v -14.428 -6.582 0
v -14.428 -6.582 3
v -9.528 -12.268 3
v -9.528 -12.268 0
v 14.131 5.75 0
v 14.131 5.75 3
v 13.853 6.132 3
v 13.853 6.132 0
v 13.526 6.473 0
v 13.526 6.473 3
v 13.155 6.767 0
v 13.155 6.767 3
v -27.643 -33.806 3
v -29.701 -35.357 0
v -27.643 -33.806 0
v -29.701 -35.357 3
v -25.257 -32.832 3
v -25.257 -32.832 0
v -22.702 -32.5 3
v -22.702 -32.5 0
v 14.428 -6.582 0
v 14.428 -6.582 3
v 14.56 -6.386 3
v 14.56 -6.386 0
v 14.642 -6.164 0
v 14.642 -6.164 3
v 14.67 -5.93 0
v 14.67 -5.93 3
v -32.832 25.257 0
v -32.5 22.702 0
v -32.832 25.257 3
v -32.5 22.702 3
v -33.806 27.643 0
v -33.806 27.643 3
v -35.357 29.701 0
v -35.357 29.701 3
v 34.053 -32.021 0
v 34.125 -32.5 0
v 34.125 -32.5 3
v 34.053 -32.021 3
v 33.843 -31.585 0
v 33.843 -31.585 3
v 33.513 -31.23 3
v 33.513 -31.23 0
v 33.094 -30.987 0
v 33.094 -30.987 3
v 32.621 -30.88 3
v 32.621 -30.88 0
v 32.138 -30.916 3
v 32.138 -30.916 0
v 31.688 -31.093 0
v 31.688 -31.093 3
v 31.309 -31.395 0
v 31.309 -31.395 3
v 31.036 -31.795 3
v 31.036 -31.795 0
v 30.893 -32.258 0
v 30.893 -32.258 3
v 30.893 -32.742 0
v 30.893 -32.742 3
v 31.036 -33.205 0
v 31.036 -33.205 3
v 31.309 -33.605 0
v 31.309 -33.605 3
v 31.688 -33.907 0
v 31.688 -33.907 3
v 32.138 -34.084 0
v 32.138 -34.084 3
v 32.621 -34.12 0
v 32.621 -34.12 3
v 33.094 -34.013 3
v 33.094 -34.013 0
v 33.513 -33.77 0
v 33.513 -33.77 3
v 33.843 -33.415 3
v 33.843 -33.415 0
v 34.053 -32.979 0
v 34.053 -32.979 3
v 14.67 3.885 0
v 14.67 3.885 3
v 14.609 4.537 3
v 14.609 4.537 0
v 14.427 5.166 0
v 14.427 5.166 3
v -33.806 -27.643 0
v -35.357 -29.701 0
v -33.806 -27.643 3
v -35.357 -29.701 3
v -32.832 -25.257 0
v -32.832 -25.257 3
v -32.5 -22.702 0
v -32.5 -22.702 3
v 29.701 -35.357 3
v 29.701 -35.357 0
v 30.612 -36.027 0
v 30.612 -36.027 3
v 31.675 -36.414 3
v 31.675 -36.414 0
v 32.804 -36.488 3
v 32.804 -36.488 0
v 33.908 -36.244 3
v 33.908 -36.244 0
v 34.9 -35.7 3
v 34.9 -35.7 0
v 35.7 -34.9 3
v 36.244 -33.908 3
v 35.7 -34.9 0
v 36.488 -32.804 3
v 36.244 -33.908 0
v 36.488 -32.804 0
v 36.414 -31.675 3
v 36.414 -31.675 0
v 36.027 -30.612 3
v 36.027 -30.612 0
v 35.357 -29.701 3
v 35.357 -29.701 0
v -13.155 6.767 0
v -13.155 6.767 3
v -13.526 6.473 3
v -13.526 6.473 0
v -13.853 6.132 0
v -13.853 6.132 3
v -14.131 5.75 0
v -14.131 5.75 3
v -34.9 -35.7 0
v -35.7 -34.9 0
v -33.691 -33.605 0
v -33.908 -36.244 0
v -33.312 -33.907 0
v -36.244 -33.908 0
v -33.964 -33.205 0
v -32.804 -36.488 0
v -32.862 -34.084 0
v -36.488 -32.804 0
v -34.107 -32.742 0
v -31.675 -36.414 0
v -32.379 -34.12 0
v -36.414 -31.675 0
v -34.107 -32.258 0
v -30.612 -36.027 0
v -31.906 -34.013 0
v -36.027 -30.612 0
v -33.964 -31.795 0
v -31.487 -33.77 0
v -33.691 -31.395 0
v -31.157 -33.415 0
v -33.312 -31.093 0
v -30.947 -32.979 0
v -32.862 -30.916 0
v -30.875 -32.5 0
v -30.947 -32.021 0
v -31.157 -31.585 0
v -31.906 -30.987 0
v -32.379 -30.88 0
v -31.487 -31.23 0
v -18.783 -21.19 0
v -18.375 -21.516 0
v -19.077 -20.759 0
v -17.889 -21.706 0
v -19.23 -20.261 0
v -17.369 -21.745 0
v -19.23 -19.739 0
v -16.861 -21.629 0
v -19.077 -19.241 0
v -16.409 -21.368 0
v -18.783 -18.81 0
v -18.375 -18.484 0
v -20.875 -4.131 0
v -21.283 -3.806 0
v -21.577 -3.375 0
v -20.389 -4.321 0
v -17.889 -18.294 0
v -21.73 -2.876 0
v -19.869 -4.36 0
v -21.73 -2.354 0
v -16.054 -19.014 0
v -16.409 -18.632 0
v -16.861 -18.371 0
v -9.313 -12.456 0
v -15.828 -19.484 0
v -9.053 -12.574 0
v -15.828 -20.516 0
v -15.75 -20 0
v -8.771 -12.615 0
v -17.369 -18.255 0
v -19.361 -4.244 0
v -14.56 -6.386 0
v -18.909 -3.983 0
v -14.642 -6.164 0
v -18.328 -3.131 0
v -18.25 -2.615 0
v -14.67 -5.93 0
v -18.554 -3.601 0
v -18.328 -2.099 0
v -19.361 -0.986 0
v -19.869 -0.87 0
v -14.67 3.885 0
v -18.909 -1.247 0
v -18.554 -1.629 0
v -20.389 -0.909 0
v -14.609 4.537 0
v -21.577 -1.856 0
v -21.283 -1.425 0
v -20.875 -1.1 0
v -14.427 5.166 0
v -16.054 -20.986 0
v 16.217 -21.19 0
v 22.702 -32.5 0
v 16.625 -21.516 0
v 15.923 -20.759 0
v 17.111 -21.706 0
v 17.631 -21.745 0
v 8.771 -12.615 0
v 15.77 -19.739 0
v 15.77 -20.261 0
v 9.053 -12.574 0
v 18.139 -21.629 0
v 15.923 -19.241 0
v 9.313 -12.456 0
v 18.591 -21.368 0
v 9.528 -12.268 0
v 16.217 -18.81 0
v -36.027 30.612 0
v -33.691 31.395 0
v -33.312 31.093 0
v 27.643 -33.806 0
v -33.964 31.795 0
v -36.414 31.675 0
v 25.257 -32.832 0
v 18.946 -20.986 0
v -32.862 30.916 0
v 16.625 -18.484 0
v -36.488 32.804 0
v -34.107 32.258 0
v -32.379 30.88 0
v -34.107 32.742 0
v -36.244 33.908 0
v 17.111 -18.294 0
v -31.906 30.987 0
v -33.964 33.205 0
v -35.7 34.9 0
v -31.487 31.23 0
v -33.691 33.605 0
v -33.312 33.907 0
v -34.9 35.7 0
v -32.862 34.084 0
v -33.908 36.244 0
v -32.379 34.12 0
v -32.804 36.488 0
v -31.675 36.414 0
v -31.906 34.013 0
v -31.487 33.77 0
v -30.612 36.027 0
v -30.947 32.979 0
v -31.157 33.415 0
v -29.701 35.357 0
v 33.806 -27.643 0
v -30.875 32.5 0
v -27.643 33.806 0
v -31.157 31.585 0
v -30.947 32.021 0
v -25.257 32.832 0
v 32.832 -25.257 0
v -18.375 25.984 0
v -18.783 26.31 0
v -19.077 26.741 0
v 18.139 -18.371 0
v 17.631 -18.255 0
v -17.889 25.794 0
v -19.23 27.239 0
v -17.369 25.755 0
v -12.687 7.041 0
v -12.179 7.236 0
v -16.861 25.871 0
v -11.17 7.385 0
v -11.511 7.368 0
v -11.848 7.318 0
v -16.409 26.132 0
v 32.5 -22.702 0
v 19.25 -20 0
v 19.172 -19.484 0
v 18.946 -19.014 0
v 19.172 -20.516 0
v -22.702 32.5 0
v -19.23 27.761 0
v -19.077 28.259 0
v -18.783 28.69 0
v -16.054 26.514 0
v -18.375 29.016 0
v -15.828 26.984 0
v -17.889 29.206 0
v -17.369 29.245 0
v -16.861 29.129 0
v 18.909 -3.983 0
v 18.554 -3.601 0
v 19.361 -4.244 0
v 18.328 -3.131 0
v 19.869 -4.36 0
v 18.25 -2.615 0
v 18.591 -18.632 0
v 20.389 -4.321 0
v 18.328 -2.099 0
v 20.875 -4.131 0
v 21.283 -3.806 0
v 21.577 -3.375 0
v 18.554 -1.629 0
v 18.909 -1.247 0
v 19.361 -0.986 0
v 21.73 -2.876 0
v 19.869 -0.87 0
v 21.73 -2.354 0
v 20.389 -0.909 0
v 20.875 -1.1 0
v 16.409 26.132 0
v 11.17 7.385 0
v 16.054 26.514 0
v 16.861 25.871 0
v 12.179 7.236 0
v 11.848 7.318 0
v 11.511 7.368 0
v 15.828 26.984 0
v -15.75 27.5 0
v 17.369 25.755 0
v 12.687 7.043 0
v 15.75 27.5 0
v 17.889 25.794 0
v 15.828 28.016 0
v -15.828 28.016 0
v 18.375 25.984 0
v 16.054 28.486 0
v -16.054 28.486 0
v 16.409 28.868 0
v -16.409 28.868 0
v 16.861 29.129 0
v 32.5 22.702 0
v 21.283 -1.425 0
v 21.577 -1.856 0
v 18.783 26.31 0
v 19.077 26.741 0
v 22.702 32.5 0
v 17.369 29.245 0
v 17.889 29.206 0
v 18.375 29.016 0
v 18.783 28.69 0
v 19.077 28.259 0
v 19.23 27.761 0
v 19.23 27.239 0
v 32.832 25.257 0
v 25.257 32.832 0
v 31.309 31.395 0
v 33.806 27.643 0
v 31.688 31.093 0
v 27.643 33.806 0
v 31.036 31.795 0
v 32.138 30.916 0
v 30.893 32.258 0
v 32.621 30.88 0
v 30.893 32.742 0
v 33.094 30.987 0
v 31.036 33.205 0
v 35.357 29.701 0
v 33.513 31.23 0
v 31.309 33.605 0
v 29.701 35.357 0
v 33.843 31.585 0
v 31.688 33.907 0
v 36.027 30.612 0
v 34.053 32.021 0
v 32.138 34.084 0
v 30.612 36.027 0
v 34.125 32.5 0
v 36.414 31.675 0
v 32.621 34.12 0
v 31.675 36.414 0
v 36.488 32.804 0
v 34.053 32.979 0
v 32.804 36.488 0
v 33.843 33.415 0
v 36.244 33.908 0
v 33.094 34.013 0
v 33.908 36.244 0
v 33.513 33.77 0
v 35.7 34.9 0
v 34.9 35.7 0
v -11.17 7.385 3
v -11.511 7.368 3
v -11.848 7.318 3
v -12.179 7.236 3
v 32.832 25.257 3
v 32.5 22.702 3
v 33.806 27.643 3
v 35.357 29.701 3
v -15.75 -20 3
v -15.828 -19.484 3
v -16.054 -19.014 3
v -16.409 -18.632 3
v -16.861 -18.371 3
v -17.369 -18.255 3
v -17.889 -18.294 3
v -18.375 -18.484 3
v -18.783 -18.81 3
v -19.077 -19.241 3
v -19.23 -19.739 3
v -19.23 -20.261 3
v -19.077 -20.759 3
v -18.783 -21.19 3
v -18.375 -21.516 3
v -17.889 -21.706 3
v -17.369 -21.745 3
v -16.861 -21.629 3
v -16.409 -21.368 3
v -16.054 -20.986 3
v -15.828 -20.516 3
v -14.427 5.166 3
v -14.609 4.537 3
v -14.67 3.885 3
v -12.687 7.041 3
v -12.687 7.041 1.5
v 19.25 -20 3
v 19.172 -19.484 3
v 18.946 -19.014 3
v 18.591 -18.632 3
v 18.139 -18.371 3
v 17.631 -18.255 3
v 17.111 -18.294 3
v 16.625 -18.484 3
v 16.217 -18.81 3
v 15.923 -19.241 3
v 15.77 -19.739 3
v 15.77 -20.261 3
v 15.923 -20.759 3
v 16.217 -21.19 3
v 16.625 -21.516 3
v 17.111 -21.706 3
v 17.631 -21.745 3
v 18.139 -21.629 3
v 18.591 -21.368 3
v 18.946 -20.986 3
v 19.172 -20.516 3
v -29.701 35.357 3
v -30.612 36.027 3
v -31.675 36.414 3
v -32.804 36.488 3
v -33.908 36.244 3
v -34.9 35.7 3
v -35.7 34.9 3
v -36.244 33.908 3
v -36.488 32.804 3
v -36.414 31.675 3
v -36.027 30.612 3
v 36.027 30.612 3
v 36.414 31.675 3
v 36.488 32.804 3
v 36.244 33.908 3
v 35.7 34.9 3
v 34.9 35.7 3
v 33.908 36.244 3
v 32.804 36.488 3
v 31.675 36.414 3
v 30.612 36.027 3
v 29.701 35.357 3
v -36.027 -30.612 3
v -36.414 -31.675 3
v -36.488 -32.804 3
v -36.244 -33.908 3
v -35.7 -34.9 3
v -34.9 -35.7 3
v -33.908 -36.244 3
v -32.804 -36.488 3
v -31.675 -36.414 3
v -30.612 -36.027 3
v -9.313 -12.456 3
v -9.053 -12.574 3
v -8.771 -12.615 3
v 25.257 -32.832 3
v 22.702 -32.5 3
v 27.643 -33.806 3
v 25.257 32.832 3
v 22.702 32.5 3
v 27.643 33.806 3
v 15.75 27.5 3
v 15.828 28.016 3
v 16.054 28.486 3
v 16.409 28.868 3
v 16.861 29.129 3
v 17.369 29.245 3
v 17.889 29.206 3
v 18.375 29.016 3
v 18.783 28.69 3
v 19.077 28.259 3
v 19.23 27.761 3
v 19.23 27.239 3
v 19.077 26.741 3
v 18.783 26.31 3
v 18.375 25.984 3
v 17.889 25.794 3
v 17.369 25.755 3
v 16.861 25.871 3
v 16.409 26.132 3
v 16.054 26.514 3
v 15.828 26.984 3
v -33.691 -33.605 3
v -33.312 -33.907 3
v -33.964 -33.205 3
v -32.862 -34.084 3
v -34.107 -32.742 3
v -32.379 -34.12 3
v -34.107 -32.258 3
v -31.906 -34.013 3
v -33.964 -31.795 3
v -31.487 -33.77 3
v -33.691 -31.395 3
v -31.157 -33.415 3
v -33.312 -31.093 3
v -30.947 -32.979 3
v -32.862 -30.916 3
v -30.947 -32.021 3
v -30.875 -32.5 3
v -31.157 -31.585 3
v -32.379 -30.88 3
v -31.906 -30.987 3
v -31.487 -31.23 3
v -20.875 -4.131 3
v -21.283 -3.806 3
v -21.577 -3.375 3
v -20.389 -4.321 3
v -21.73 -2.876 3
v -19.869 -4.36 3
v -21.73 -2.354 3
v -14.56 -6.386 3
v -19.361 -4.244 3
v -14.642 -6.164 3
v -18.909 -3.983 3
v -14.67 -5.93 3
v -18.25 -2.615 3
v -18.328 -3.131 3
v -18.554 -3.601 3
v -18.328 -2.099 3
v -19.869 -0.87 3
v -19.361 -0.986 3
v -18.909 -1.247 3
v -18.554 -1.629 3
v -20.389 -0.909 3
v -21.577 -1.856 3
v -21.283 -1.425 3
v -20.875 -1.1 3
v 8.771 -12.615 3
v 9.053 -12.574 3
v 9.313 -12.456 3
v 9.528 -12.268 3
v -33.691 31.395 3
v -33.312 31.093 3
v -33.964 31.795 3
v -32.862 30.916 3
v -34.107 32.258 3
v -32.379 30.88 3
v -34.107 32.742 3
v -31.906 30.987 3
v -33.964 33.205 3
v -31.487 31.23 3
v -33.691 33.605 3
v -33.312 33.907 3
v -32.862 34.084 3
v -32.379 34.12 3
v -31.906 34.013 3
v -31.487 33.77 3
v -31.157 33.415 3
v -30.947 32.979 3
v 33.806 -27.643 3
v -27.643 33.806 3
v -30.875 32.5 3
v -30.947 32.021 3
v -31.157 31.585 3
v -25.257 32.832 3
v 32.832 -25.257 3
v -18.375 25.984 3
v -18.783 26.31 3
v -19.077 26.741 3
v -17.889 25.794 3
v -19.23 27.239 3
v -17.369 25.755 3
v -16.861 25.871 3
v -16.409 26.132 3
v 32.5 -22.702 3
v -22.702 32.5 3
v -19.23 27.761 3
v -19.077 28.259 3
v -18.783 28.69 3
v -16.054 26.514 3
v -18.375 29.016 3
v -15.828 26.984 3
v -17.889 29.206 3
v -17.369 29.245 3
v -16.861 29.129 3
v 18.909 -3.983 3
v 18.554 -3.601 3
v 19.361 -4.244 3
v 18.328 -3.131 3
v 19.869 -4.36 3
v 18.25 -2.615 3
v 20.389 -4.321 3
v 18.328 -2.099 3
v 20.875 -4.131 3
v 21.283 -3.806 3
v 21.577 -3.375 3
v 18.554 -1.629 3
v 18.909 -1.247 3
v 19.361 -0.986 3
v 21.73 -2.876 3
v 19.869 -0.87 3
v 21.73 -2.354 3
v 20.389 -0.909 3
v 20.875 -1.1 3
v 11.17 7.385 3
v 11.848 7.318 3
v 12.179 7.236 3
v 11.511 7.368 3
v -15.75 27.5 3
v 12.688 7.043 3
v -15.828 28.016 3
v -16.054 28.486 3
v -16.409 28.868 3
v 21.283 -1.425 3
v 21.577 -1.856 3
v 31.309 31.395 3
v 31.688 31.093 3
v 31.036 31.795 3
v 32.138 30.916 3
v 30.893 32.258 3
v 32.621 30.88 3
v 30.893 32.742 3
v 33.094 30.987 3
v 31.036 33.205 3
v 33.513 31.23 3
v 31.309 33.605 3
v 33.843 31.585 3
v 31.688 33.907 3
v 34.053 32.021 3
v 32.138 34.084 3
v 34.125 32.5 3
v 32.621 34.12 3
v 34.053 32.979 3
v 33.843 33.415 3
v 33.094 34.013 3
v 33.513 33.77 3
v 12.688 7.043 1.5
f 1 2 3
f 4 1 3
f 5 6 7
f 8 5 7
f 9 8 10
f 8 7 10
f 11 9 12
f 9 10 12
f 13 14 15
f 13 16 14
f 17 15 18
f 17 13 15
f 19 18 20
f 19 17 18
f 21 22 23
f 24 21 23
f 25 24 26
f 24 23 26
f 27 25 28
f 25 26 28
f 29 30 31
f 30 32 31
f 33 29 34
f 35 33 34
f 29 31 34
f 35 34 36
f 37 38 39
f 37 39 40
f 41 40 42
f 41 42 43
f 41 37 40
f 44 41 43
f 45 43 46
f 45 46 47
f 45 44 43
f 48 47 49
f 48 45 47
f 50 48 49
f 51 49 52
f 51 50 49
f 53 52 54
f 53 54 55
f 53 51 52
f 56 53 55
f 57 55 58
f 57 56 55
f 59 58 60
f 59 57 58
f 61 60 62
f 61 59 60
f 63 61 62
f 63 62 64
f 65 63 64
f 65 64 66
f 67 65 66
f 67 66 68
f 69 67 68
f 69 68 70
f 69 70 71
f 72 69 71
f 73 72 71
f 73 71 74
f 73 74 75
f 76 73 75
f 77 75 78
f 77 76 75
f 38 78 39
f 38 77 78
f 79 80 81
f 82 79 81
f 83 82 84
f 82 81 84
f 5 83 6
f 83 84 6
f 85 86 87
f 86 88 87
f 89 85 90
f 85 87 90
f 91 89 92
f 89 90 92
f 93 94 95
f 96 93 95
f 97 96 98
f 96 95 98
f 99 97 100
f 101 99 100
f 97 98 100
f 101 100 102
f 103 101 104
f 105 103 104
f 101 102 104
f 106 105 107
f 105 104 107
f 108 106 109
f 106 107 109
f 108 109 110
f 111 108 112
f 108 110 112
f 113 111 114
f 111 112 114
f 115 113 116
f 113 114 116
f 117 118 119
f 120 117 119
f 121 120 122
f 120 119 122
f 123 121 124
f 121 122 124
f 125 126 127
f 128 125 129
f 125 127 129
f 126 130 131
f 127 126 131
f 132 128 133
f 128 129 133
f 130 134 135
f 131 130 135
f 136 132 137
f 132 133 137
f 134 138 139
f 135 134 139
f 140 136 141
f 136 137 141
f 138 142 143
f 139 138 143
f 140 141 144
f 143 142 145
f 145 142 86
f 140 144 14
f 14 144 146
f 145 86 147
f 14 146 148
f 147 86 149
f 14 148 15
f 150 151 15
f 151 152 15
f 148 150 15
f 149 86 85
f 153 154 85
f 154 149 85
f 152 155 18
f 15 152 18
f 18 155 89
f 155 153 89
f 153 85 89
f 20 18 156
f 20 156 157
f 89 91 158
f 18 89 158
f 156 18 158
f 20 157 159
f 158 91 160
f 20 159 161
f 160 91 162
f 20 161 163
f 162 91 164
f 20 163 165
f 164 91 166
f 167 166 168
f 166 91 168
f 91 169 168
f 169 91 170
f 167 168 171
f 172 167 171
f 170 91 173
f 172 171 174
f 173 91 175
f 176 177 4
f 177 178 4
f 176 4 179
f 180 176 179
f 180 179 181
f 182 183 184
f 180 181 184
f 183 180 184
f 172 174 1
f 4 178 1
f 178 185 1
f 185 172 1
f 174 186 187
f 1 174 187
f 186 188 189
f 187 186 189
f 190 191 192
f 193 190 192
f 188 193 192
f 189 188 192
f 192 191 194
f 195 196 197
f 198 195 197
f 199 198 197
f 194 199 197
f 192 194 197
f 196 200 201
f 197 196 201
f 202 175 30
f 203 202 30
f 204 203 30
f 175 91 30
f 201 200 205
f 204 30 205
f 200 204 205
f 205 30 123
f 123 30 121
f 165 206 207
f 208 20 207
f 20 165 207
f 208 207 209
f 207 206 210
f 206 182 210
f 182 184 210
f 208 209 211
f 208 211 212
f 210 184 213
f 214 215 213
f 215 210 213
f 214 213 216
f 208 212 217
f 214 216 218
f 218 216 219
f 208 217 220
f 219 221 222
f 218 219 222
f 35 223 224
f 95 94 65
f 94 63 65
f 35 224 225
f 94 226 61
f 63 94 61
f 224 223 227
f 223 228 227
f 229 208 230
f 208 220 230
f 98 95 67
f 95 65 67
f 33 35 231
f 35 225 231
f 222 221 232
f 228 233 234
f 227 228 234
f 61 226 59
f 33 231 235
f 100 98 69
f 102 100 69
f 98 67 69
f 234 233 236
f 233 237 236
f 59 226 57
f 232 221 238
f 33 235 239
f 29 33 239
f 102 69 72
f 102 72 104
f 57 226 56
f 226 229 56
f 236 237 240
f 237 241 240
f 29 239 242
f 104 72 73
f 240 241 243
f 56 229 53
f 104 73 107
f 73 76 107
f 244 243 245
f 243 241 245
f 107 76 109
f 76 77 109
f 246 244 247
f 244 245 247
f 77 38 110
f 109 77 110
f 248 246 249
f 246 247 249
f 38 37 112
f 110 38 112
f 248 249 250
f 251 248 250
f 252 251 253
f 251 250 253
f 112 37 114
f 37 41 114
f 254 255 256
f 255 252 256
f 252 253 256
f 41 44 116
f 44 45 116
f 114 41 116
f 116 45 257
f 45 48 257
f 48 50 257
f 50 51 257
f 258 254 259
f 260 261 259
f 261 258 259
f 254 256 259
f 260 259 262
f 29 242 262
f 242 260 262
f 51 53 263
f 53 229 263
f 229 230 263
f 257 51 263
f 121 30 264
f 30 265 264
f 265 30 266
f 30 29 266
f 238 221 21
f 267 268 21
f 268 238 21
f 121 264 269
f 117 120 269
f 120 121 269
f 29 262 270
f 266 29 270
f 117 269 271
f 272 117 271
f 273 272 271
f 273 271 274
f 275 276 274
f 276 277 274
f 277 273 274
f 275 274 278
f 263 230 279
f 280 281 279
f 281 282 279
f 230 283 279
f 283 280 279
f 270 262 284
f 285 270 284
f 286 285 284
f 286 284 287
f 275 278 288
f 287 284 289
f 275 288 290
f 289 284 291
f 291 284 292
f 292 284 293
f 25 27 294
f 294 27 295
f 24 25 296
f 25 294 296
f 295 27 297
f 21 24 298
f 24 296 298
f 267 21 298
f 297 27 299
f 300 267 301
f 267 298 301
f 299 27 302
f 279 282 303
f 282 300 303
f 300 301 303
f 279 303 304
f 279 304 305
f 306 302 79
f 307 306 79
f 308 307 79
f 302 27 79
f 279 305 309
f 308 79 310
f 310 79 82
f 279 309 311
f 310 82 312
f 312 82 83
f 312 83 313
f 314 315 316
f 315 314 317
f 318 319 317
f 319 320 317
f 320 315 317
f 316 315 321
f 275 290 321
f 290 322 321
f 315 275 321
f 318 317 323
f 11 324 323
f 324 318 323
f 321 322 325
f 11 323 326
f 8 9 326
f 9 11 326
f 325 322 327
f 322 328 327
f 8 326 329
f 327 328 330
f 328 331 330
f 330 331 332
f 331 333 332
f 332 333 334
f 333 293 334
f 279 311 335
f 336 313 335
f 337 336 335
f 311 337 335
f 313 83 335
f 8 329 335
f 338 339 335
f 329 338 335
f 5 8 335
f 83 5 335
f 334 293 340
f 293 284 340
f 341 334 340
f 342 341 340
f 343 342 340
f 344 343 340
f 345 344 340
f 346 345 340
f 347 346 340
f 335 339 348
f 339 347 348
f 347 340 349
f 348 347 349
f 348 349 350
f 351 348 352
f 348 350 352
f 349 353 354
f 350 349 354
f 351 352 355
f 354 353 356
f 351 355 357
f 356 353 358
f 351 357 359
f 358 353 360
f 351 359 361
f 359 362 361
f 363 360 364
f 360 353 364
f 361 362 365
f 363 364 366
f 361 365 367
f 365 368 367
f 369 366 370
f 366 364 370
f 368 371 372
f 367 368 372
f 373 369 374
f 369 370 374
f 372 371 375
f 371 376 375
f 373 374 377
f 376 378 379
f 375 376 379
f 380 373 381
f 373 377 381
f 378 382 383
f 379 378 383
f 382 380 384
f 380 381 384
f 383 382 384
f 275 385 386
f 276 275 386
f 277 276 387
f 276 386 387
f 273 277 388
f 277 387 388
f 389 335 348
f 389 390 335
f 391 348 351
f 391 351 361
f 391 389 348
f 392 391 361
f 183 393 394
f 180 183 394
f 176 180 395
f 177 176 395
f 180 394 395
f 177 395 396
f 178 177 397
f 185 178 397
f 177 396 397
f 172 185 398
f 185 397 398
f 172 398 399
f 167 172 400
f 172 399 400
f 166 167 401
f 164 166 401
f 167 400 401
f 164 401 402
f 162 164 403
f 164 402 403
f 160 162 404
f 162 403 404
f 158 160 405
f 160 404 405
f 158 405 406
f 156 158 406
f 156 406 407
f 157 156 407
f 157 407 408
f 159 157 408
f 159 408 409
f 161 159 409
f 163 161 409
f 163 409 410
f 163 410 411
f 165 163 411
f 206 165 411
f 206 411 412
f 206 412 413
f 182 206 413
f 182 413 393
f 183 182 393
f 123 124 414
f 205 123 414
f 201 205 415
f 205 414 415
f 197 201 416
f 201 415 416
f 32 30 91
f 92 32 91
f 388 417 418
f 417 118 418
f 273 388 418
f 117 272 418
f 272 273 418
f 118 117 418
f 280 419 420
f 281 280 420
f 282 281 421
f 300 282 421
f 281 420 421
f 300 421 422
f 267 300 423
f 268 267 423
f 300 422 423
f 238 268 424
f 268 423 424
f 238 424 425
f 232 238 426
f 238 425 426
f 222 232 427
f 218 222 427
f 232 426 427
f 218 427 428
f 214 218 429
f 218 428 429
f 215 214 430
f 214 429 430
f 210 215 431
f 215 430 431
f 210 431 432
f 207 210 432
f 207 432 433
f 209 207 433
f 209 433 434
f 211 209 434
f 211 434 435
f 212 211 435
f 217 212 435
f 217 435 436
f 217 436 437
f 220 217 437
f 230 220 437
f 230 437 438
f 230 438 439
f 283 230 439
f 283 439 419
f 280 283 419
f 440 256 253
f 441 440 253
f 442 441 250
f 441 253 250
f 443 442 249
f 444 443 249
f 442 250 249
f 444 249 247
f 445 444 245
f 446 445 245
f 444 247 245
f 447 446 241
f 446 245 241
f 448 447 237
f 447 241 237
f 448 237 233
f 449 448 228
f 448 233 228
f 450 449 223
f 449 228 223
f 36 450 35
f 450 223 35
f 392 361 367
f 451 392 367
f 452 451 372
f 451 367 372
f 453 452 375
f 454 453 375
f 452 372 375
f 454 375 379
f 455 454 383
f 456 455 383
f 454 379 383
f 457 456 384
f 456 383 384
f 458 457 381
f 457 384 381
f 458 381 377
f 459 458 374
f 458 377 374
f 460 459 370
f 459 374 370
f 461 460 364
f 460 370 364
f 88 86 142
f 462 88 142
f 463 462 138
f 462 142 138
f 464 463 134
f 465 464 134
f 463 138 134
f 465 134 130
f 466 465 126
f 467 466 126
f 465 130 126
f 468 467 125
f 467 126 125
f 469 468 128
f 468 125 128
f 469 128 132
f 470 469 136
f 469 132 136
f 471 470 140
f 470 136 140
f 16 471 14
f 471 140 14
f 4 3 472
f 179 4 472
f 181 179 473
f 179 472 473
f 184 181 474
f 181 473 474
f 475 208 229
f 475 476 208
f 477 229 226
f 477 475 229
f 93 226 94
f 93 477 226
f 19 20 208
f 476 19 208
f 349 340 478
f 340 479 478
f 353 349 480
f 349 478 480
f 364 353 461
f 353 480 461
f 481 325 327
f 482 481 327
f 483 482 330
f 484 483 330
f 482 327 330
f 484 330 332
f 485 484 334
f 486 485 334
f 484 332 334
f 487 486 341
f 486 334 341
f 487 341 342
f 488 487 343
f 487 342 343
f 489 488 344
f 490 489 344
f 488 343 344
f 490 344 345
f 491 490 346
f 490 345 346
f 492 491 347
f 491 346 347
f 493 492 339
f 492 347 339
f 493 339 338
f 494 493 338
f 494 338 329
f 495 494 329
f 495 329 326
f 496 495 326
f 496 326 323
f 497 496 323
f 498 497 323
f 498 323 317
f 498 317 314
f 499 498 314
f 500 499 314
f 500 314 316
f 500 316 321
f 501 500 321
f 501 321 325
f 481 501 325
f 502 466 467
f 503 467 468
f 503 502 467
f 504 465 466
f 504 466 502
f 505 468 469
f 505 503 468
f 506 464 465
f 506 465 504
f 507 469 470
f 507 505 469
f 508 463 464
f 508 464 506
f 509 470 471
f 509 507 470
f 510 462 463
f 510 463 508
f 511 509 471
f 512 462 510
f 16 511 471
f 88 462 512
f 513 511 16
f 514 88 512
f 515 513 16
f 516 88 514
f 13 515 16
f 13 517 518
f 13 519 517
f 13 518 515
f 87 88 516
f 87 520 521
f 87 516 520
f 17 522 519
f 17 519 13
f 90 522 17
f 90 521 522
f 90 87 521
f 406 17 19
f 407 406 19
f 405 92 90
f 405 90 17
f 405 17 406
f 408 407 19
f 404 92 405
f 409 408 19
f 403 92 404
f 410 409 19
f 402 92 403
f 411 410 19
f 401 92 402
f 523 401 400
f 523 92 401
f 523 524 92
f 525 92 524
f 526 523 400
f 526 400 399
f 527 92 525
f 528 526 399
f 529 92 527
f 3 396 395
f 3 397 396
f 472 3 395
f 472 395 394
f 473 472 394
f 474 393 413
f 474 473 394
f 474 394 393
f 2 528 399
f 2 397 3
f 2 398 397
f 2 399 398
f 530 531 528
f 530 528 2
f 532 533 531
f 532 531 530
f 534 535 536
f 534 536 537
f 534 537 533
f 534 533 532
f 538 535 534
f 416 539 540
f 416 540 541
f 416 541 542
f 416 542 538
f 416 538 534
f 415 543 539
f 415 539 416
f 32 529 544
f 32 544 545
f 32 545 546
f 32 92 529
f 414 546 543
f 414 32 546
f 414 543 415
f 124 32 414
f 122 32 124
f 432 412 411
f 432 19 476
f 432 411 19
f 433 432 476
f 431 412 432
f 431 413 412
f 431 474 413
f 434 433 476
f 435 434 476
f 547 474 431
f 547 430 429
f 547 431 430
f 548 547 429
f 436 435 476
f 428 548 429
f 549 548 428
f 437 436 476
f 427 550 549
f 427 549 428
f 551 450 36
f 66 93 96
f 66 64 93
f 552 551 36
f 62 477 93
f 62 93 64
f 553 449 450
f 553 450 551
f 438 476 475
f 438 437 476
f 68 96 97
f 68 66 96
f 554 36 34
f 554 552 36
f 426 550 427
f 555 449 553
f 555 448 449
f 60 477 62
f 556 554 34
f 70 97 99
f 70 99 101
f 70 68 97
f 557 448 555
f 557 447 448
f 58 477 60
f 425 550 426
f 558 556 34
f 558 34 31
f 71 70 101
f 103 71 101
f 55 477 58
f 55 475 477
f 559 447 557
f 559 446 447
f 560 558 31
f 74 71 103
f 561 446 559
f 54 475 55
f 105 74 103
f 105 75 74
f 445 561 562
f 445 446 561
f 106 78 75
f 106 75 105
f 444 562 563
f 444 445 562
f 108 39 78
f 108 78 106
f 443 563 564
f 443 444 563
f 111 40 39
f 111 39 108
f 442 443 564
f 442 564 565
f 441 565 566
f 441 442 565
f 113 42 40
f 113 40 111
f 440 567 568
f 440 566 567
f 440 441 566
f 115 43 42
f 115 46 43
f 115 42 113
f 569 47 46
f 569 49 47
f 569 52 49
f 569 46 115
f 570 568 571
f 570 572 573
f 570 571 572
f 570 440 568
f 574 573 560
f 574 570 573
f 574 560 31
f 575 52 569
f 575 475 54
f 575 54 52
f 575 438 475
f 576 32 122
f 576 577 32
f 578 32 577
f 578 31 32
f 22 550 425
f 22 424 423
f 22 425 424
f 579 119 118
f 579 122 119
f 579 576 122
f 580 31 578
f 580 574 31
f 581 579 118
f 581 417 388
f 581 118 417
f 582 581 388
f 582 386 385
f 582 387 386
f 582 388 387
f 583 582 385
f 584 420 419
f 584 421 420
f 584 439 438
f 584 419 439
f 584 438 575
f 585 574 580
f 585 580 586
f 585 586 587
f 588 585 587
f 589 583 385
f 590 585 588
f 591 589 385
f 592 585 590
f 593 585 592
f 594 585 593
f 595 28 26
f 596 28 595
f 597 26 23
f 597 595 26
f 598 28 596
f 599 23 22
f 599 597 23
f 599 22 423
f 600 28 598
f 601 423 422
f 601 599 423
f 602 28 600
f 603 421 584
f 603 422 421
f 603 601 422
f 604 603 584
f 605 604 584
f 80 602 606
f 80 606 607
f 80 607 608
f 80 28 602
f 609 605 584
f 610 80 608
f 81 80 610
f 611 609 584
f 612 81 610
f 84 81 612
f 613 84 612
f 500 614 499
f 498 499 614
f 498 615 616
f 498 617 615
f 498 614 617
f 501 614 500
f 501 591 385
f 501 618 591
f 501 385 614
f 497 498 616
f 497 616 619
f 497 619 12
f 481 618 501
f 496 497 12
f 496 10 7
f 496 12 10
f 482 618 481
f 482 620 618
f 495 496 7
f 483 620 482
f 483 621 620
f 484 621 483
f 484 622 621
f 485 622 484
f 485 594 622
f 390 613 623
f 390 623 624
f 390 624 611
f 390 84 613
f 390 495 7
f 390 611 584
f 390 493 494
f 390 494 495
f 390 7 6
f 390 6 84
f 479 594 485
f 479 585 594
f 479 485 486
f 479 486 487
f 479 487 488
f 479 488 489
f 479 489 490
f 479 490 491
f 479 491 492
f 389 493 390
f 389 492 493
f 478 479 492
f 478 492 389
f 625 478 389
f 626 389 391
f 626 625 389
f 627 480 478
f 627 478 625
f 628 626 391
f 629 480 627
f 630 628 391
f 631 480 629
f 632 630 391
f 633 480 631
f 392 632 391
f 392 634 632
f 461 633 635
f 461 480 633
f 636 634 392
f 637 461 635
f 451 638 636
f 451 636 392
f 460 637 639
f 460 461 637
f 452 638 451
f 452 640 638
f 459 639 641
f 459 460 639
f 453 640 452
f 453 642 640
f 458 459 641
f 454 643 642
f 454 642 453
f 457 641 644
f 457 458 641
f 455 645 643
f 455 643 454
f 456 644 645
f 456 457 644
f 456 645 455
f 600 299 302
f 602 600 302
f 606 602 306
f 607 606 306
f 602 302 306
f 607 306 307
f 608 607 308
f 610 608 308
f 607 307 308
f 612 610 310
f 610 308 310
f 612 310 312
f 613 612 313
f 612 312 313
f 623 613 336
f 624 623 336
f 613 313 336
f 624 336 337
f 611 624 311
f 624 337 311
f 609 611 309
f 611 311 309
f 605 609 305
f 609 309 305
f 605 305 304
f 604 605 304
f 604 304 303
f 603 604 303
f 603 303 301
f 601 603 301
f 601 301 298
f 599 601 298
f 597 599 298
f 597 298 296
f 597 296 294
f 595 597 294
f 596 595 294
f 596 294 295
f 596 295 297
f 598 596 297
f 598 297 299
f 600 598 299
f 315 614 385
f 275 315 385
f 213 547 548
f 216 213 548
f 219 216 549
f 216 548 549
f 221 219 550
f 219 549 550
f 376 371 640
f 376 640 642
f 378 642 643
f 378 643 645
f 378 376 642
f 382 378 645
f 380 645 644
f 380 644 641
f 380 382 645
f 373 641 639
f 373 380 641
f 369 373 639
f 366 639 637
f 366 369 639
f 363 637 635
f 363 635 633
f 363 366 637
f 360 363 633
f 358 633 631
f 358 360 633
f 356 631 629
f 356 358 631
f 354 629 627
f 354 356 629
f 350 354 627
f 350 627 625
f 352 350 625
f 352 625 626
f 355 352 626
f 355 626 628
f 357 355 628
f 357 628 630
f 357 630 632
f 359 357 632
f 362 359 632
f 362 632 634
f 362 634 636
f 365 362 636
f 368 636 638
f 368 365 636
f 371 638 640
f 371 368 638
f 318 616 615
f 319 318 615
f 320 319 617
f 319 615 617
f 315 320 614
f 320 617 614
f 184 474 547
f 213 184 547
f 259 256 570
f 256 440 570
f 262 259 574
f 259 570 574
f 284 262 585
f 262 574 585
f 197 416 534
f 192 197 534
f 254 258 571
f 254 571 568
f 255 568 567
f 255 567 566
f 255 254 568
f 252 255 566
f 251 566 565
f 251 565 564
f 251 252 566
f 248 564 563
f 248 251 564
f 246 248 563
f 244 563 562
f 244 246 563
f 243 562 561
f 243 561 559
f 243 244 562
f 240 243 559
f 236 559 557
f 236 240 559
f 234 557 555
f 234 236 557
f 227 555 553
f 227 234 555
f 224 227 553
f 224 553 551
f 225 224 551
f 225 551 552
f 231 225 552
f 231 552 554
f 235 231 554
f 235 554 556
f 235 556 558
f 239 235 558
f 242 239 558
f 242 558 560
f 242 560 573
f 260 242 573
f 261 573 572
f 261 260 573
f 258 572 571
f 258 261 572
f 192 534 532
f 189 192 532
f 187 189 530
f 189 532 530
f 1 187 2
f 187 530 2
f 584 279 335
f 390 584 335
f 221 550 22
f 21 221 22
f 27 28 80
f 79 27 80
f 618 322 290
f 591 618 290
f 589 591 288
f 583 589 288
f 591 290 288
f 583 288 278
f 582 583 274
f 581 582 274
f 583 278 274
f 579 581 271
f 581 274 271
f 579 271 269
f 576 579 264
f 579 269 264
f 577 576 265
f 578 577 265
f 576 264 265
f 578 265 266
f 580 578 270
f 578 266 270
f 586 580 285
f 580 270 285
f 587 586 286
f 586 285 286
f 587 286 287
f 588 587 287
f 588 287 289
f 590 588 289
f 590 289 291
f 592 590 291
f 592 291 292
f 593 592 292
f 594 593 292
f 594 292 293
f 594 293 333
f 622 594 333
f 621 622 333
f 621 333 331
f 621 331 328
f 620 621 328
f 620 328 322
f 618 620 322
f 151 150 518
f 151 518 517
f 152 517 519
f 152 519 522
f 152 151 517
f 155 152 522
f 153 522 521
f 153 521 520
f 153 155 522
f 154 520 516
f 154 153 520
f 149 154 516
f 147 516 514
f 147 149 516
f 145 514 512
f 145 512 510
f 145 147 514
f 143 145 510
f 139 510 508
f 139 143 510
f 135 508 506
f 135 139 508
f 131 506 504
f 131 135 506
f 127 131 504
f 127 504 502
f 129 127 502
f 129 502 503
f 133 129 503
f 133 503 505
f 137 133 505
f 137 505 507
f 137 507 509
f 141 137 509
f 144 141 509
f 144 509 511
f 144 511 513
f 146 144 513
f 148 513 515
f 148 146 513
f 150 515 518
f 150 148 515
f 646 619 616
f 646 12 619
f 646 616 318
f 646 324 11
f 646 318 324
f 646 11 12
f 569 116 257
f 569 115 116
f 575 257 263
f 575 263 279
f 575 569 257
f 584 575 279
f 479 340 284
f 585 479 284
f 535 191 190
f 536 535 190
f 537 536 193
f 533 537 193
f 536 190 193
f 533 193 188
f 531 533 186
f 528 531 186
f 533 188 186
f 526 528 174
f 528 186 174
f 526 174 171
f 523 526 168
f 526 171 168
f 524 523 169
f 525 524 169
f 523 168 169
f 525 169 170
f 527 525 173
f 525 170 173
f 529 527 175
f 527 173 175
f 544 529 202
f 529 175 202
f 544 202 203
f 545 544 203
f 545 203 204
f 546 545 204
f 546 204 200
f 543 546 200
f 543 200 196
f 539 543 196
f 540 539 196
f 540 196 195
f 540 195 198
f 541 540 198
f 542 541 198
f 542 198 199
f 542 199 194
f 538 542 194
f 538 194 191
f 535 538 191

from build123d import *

# Parameters (mm, degrees)
SKETCH_1_R          = 1.625
EXTRUDE_1_DEPTH     = 3
FILLET_1_R          = 10
SKETCH_3_R          = 1.75
CUT_EXTRUDE_1_DEPTH = 10
SKETCH_4_R          = 1.75
CUT_EXTRUDE_2_DEPTH = 10
SKETCH_5_R          = 1.75
CUT_EXTRUDE_3_DEPTH = 10
CUT_EXTRUDE_5_DEPTH = 10


with BuildPart() as part:
    # Эскиз1 → Бобышка-Вытянуть1 (new body)
    with BuildSketch(Plane.XY):
        with BuildLine():
            ThreePointArc((-32.5, -28.5), (-35.328427125, -35.328427125), (-28.5, -32.5))
            Line((-28.5, -32.5), (28.5, -32.5))
            ThreePointArc((28.5, -32.5), (35.328427125, -35.328427125), (32.5, -28.5))
            Line((32.5, -28.5), (32.5, 28.5))
            ThreePointArc((32.5, 28.5), (35.328427125, 35.328427125), (28.5, 32.5))
            Line((28.5, 32.5), (-28.5, 32.5))
            ThreePointArc((-28.5, 32.5), (-35.328427125, 35.328427125), (-32.5, 28.5))
            Line((-32.5, 28.5), (-32.5, -28.5))
        make_face()
        with Locations((-32.5, -32.5)):
            Circle(SKETCH_1_R, mode=Mode.SUBTRACT)
        with Locations((32.5, 32.5)):
            Circle(SKETCH_1_R, mode=Mode.SUBTRACT)
        with Locations((-32.5, 32.5)):
            Circle(SKETCH_1_R, mode=Mode.SUBTRACT)
        with Locations((32.5, -32.5)):
            Circle(SKETCH_1_R, mode=Mode.SUBTRACT)
    extrude(amount=EXTRUDE_1_DEPTH)

    # Скругление1
    fillet_1_edges = [part.edges().sort_by_distance(p)[0] for p in [
        (-32.5, -28.5, 1.5),
        (-32.5, 28.5, 1.5),
        (-28.5, 32.5, 1.5),
        (28.5, 32.5, 1.5),
        (32.5, 28.5, 1.5),
        (32.5, -28.5, 1.5),
        (28.5, -32.5, 1.5),
        (-28.5, -32.5, 1.5),
    ]]
    fillet(fillet_1_edges, radius=FILLET_1_R)

    # Эскиз3 → Вырез-Вытянуть1 (cut)
    with BuildSketch(Plane(origin=(0, 0, 0), x_dir=(-1, 0, 0), z_dir=(0, 0, -1))):
        with Locations((-17.5, 27.5)):
            Circle(SKETCH_3_R)
        with Locations(Location((17.5, 27.5, 0), (0, 0, 180))):
            Circle(SKETCH_3_R)
    extrude(amount=-CUT_EXTRUDE_1_DEPTH, mode=Mode.SUBTRACT)

    # Эскиз4 → Вырез-Вытянуть2 (cut)
    with BuildSketch(Plane(origin=(0, 0, 0), x_dir=(-1, 0, 0), z_dir=(0, 0, -1))):
        with Locations((-20, -2.615263412)):
            Circle(SKETCH_4_R)
        with Locations(Location((20, -2.615263412, 0), (0, 0, 180))):
            Circle(SKETCH_4_R)
    extrude(amount=-CUT_EXTRUDE_2_DEPTH, mode=Mode.SUBTRACT)

    # Эскиз5 → Вырез-Вытянуть3 (cut)
    with BuildSketch(Plane.XY.offset(3)):
        with Locations((-17.5, -20)):
            Circle(SKETCH_5_R)
        with Locations((17.5, -20)):
            Circle(SKETCH_5_R)
    extrude(amount=-CUT_EXTRUDE_3_DEPTH, mode=Mode.SUBTRACT)

    # Эскиз6 → Вырез-Вытянуть5 (cut)
    with BuildSketch(Plane.XY.offset(3)):
        with BuildLine():
            ThreePointArc((-14.17, 3.884736588), (-13.825652378, 5.280268906), (-12.871659701, 6.355435733))
            Line((-12.871659701, 6.355435733), (-14.131289938, 5.750416599))
            ThreePointArc((-14.131289938, 5.750416599), (-14.532626561, 4.855685922), (-14.67, 3.884736588))
            Line((-14.67, 3.884736588), (-14.67, -5.929561494))
            ThreePointArc((-14.67, -5.929561494), (-14.607432841, -6.277727646), (-14.427560661, -6.582326264))
            Line((-14.427560661, -6.582326264), (-9.528380842, -12.268028181))
            ThreePointArc((-9.528380842, -12.268028181), (-9.187494653, -12.524319177), (-8.770820181, -12.615263412))
            Line((-8.770820181, -12.615263412), (8.770820181, -12.615263412))
            ThreePointArc((8.770820181, -12.615263412), (9.187494653, -12.524319177), (9.528380842, -12.268028181))
            Line((9.528380842, -12.268028181), (14.427560661, -6.582326264))
            ThreePointArc((14.427560661, -6.582326264), (14.607432841, -6.277727646), (14.67, -5.929561494))
            Line((14.67, -5.929561494), (14.67, 3.884736588))
            ThreePointArc((14.67, 3.884736588), (14.532626561, 4.855685922), (14.131289938, 5.750416599))
            Line((14.131289938, 5.750416599), (12.871659701, 6.355435733))
            ThreePointArc((12.871659701, 6.355435733), (13.825652378, 5.280268906), (14.17, 3.884736588))
            Line((14.17, 3.884736588), (14.17, -5.929561494))
            ThreePointArc((14.17, -5.929561494), (14.13871642, -6.10364457), (14.048780331, -6.255943879))
            Line((14.048780331, -6.255943879), (9.149600512, -11.941645796))
            ThreePointArc((9.149600512, -11.941645796), (8.979157417, -12.069791294), (8.770820181, -12.115263412))
            Line((8.770820181, -12.115263412), (-8.770820181, -12.115263412))
            ThreePointArc((-8.770820181, -12.115263412), (-8.979157417, -12.069791294), (-9.149600512, -11.941645796))
            Line((-9.149600512, -11.941645796), (-14.048780331, -6.255943879))
            ThreePointArc((-14.048780331, -6.255943879), (-14.13871642, -6.10364457), (-14.17, -5.929561494))
            Line((-14.17, -5.929561494), (-14.17, 3.884736588))
        make_face()
        with BuildLine():
            Line((11.17, 7.384736588), (10.728688662, 7.384736588))
            Line((10.728688662, 7.384736588), (12.034826728, 6.757379053))
            ThreePointArc((12.034826728, 6.757379053), (12.468885198, 6.588973494), (12.871659701, 6.355435733))
            Line((12.871659701, 6.355435733), (14.131289938, 5.750416599))
            ThreePointArc((14.131289938, 5.750416599), (13.694992017, 6.308455903), (13.155269651, 6.767218923))
            add(Edge.make_bspline(
                [(12.178964517, 7.236152797), (12.708169697, 7.084996084), (13.155269651, 6.767218923)],
                knots=[0, 0, 0, 1, 1, 1], degree=2))
            ThreePointArc((12.178964517, 7.236152797), (11.679923165, 7.347391403), (11.17, 7.384736588))
        make_face()
        with BuildLine():
            Line((-10.728688662, 7.384736588), (-12.034826728, 6.757379053))
            ThreePointArc((-12.034826728, 6.757379053), (-11.607076999, 6.85272643), (-11.17, 6.884736588))
            Line((-11.17, 6.884736588), (11.17, 6.884736588))
            ThreePointArc((11.17, 6.884736588), (11.607076999, 6.85272643), (12.034826728, 6.757379053))
            Line((12.034826728, 6.757379053), (10.728688662, 7.384736588))
            Line((10.728688662, 7.384736588), (-10.728688662, 7.384736588))
        make_face()
        with BuildLine():
            Line((-14.131289938, 5.750416599), (-12.871659701, 6.355435733))
            ThreePointArc((-12.871659701, 6.355435733), (-12.468885198, 6.588973494), (-12.034826728, 6.757379053))
            Line((-12.034826728, 6.757379053), (-10.728688662, 7.384736588))
            Line((-10.728688662, 7.384736588), (-11.17, 7.384736588))
            ThreePointArc((-11.17, 7.384736588), (-11.679923165, 7.347391403), (-12.178964517, 7.236152797))
            add(Edge.make_bspline(
                [(-12.178964517, 7.236152797), (-12.706483, 7.080112966), (-13.155269651, 6.767218923)],
                knots=[0, 0, 0, 1, 1, 1], degree=2))
            ThreePointArc((-13.155269651, 6.767218923), (-13.694992017, 6.308455903), (-14.131289938, 5.750416599))
        make_face()
    extrude(amount=-CUT_EXTRUDE_5_DEPTH, mode=Mode.SUBTRACT)


with BuildPart() as body_2:
    # of the pieces the cut leaves, the one that is kept (cut_extrude_5_keep)
    add(part.part.solids().sort_by_distance((-32.5, 22.702041029, 0))[0])


solid = body_2.part
